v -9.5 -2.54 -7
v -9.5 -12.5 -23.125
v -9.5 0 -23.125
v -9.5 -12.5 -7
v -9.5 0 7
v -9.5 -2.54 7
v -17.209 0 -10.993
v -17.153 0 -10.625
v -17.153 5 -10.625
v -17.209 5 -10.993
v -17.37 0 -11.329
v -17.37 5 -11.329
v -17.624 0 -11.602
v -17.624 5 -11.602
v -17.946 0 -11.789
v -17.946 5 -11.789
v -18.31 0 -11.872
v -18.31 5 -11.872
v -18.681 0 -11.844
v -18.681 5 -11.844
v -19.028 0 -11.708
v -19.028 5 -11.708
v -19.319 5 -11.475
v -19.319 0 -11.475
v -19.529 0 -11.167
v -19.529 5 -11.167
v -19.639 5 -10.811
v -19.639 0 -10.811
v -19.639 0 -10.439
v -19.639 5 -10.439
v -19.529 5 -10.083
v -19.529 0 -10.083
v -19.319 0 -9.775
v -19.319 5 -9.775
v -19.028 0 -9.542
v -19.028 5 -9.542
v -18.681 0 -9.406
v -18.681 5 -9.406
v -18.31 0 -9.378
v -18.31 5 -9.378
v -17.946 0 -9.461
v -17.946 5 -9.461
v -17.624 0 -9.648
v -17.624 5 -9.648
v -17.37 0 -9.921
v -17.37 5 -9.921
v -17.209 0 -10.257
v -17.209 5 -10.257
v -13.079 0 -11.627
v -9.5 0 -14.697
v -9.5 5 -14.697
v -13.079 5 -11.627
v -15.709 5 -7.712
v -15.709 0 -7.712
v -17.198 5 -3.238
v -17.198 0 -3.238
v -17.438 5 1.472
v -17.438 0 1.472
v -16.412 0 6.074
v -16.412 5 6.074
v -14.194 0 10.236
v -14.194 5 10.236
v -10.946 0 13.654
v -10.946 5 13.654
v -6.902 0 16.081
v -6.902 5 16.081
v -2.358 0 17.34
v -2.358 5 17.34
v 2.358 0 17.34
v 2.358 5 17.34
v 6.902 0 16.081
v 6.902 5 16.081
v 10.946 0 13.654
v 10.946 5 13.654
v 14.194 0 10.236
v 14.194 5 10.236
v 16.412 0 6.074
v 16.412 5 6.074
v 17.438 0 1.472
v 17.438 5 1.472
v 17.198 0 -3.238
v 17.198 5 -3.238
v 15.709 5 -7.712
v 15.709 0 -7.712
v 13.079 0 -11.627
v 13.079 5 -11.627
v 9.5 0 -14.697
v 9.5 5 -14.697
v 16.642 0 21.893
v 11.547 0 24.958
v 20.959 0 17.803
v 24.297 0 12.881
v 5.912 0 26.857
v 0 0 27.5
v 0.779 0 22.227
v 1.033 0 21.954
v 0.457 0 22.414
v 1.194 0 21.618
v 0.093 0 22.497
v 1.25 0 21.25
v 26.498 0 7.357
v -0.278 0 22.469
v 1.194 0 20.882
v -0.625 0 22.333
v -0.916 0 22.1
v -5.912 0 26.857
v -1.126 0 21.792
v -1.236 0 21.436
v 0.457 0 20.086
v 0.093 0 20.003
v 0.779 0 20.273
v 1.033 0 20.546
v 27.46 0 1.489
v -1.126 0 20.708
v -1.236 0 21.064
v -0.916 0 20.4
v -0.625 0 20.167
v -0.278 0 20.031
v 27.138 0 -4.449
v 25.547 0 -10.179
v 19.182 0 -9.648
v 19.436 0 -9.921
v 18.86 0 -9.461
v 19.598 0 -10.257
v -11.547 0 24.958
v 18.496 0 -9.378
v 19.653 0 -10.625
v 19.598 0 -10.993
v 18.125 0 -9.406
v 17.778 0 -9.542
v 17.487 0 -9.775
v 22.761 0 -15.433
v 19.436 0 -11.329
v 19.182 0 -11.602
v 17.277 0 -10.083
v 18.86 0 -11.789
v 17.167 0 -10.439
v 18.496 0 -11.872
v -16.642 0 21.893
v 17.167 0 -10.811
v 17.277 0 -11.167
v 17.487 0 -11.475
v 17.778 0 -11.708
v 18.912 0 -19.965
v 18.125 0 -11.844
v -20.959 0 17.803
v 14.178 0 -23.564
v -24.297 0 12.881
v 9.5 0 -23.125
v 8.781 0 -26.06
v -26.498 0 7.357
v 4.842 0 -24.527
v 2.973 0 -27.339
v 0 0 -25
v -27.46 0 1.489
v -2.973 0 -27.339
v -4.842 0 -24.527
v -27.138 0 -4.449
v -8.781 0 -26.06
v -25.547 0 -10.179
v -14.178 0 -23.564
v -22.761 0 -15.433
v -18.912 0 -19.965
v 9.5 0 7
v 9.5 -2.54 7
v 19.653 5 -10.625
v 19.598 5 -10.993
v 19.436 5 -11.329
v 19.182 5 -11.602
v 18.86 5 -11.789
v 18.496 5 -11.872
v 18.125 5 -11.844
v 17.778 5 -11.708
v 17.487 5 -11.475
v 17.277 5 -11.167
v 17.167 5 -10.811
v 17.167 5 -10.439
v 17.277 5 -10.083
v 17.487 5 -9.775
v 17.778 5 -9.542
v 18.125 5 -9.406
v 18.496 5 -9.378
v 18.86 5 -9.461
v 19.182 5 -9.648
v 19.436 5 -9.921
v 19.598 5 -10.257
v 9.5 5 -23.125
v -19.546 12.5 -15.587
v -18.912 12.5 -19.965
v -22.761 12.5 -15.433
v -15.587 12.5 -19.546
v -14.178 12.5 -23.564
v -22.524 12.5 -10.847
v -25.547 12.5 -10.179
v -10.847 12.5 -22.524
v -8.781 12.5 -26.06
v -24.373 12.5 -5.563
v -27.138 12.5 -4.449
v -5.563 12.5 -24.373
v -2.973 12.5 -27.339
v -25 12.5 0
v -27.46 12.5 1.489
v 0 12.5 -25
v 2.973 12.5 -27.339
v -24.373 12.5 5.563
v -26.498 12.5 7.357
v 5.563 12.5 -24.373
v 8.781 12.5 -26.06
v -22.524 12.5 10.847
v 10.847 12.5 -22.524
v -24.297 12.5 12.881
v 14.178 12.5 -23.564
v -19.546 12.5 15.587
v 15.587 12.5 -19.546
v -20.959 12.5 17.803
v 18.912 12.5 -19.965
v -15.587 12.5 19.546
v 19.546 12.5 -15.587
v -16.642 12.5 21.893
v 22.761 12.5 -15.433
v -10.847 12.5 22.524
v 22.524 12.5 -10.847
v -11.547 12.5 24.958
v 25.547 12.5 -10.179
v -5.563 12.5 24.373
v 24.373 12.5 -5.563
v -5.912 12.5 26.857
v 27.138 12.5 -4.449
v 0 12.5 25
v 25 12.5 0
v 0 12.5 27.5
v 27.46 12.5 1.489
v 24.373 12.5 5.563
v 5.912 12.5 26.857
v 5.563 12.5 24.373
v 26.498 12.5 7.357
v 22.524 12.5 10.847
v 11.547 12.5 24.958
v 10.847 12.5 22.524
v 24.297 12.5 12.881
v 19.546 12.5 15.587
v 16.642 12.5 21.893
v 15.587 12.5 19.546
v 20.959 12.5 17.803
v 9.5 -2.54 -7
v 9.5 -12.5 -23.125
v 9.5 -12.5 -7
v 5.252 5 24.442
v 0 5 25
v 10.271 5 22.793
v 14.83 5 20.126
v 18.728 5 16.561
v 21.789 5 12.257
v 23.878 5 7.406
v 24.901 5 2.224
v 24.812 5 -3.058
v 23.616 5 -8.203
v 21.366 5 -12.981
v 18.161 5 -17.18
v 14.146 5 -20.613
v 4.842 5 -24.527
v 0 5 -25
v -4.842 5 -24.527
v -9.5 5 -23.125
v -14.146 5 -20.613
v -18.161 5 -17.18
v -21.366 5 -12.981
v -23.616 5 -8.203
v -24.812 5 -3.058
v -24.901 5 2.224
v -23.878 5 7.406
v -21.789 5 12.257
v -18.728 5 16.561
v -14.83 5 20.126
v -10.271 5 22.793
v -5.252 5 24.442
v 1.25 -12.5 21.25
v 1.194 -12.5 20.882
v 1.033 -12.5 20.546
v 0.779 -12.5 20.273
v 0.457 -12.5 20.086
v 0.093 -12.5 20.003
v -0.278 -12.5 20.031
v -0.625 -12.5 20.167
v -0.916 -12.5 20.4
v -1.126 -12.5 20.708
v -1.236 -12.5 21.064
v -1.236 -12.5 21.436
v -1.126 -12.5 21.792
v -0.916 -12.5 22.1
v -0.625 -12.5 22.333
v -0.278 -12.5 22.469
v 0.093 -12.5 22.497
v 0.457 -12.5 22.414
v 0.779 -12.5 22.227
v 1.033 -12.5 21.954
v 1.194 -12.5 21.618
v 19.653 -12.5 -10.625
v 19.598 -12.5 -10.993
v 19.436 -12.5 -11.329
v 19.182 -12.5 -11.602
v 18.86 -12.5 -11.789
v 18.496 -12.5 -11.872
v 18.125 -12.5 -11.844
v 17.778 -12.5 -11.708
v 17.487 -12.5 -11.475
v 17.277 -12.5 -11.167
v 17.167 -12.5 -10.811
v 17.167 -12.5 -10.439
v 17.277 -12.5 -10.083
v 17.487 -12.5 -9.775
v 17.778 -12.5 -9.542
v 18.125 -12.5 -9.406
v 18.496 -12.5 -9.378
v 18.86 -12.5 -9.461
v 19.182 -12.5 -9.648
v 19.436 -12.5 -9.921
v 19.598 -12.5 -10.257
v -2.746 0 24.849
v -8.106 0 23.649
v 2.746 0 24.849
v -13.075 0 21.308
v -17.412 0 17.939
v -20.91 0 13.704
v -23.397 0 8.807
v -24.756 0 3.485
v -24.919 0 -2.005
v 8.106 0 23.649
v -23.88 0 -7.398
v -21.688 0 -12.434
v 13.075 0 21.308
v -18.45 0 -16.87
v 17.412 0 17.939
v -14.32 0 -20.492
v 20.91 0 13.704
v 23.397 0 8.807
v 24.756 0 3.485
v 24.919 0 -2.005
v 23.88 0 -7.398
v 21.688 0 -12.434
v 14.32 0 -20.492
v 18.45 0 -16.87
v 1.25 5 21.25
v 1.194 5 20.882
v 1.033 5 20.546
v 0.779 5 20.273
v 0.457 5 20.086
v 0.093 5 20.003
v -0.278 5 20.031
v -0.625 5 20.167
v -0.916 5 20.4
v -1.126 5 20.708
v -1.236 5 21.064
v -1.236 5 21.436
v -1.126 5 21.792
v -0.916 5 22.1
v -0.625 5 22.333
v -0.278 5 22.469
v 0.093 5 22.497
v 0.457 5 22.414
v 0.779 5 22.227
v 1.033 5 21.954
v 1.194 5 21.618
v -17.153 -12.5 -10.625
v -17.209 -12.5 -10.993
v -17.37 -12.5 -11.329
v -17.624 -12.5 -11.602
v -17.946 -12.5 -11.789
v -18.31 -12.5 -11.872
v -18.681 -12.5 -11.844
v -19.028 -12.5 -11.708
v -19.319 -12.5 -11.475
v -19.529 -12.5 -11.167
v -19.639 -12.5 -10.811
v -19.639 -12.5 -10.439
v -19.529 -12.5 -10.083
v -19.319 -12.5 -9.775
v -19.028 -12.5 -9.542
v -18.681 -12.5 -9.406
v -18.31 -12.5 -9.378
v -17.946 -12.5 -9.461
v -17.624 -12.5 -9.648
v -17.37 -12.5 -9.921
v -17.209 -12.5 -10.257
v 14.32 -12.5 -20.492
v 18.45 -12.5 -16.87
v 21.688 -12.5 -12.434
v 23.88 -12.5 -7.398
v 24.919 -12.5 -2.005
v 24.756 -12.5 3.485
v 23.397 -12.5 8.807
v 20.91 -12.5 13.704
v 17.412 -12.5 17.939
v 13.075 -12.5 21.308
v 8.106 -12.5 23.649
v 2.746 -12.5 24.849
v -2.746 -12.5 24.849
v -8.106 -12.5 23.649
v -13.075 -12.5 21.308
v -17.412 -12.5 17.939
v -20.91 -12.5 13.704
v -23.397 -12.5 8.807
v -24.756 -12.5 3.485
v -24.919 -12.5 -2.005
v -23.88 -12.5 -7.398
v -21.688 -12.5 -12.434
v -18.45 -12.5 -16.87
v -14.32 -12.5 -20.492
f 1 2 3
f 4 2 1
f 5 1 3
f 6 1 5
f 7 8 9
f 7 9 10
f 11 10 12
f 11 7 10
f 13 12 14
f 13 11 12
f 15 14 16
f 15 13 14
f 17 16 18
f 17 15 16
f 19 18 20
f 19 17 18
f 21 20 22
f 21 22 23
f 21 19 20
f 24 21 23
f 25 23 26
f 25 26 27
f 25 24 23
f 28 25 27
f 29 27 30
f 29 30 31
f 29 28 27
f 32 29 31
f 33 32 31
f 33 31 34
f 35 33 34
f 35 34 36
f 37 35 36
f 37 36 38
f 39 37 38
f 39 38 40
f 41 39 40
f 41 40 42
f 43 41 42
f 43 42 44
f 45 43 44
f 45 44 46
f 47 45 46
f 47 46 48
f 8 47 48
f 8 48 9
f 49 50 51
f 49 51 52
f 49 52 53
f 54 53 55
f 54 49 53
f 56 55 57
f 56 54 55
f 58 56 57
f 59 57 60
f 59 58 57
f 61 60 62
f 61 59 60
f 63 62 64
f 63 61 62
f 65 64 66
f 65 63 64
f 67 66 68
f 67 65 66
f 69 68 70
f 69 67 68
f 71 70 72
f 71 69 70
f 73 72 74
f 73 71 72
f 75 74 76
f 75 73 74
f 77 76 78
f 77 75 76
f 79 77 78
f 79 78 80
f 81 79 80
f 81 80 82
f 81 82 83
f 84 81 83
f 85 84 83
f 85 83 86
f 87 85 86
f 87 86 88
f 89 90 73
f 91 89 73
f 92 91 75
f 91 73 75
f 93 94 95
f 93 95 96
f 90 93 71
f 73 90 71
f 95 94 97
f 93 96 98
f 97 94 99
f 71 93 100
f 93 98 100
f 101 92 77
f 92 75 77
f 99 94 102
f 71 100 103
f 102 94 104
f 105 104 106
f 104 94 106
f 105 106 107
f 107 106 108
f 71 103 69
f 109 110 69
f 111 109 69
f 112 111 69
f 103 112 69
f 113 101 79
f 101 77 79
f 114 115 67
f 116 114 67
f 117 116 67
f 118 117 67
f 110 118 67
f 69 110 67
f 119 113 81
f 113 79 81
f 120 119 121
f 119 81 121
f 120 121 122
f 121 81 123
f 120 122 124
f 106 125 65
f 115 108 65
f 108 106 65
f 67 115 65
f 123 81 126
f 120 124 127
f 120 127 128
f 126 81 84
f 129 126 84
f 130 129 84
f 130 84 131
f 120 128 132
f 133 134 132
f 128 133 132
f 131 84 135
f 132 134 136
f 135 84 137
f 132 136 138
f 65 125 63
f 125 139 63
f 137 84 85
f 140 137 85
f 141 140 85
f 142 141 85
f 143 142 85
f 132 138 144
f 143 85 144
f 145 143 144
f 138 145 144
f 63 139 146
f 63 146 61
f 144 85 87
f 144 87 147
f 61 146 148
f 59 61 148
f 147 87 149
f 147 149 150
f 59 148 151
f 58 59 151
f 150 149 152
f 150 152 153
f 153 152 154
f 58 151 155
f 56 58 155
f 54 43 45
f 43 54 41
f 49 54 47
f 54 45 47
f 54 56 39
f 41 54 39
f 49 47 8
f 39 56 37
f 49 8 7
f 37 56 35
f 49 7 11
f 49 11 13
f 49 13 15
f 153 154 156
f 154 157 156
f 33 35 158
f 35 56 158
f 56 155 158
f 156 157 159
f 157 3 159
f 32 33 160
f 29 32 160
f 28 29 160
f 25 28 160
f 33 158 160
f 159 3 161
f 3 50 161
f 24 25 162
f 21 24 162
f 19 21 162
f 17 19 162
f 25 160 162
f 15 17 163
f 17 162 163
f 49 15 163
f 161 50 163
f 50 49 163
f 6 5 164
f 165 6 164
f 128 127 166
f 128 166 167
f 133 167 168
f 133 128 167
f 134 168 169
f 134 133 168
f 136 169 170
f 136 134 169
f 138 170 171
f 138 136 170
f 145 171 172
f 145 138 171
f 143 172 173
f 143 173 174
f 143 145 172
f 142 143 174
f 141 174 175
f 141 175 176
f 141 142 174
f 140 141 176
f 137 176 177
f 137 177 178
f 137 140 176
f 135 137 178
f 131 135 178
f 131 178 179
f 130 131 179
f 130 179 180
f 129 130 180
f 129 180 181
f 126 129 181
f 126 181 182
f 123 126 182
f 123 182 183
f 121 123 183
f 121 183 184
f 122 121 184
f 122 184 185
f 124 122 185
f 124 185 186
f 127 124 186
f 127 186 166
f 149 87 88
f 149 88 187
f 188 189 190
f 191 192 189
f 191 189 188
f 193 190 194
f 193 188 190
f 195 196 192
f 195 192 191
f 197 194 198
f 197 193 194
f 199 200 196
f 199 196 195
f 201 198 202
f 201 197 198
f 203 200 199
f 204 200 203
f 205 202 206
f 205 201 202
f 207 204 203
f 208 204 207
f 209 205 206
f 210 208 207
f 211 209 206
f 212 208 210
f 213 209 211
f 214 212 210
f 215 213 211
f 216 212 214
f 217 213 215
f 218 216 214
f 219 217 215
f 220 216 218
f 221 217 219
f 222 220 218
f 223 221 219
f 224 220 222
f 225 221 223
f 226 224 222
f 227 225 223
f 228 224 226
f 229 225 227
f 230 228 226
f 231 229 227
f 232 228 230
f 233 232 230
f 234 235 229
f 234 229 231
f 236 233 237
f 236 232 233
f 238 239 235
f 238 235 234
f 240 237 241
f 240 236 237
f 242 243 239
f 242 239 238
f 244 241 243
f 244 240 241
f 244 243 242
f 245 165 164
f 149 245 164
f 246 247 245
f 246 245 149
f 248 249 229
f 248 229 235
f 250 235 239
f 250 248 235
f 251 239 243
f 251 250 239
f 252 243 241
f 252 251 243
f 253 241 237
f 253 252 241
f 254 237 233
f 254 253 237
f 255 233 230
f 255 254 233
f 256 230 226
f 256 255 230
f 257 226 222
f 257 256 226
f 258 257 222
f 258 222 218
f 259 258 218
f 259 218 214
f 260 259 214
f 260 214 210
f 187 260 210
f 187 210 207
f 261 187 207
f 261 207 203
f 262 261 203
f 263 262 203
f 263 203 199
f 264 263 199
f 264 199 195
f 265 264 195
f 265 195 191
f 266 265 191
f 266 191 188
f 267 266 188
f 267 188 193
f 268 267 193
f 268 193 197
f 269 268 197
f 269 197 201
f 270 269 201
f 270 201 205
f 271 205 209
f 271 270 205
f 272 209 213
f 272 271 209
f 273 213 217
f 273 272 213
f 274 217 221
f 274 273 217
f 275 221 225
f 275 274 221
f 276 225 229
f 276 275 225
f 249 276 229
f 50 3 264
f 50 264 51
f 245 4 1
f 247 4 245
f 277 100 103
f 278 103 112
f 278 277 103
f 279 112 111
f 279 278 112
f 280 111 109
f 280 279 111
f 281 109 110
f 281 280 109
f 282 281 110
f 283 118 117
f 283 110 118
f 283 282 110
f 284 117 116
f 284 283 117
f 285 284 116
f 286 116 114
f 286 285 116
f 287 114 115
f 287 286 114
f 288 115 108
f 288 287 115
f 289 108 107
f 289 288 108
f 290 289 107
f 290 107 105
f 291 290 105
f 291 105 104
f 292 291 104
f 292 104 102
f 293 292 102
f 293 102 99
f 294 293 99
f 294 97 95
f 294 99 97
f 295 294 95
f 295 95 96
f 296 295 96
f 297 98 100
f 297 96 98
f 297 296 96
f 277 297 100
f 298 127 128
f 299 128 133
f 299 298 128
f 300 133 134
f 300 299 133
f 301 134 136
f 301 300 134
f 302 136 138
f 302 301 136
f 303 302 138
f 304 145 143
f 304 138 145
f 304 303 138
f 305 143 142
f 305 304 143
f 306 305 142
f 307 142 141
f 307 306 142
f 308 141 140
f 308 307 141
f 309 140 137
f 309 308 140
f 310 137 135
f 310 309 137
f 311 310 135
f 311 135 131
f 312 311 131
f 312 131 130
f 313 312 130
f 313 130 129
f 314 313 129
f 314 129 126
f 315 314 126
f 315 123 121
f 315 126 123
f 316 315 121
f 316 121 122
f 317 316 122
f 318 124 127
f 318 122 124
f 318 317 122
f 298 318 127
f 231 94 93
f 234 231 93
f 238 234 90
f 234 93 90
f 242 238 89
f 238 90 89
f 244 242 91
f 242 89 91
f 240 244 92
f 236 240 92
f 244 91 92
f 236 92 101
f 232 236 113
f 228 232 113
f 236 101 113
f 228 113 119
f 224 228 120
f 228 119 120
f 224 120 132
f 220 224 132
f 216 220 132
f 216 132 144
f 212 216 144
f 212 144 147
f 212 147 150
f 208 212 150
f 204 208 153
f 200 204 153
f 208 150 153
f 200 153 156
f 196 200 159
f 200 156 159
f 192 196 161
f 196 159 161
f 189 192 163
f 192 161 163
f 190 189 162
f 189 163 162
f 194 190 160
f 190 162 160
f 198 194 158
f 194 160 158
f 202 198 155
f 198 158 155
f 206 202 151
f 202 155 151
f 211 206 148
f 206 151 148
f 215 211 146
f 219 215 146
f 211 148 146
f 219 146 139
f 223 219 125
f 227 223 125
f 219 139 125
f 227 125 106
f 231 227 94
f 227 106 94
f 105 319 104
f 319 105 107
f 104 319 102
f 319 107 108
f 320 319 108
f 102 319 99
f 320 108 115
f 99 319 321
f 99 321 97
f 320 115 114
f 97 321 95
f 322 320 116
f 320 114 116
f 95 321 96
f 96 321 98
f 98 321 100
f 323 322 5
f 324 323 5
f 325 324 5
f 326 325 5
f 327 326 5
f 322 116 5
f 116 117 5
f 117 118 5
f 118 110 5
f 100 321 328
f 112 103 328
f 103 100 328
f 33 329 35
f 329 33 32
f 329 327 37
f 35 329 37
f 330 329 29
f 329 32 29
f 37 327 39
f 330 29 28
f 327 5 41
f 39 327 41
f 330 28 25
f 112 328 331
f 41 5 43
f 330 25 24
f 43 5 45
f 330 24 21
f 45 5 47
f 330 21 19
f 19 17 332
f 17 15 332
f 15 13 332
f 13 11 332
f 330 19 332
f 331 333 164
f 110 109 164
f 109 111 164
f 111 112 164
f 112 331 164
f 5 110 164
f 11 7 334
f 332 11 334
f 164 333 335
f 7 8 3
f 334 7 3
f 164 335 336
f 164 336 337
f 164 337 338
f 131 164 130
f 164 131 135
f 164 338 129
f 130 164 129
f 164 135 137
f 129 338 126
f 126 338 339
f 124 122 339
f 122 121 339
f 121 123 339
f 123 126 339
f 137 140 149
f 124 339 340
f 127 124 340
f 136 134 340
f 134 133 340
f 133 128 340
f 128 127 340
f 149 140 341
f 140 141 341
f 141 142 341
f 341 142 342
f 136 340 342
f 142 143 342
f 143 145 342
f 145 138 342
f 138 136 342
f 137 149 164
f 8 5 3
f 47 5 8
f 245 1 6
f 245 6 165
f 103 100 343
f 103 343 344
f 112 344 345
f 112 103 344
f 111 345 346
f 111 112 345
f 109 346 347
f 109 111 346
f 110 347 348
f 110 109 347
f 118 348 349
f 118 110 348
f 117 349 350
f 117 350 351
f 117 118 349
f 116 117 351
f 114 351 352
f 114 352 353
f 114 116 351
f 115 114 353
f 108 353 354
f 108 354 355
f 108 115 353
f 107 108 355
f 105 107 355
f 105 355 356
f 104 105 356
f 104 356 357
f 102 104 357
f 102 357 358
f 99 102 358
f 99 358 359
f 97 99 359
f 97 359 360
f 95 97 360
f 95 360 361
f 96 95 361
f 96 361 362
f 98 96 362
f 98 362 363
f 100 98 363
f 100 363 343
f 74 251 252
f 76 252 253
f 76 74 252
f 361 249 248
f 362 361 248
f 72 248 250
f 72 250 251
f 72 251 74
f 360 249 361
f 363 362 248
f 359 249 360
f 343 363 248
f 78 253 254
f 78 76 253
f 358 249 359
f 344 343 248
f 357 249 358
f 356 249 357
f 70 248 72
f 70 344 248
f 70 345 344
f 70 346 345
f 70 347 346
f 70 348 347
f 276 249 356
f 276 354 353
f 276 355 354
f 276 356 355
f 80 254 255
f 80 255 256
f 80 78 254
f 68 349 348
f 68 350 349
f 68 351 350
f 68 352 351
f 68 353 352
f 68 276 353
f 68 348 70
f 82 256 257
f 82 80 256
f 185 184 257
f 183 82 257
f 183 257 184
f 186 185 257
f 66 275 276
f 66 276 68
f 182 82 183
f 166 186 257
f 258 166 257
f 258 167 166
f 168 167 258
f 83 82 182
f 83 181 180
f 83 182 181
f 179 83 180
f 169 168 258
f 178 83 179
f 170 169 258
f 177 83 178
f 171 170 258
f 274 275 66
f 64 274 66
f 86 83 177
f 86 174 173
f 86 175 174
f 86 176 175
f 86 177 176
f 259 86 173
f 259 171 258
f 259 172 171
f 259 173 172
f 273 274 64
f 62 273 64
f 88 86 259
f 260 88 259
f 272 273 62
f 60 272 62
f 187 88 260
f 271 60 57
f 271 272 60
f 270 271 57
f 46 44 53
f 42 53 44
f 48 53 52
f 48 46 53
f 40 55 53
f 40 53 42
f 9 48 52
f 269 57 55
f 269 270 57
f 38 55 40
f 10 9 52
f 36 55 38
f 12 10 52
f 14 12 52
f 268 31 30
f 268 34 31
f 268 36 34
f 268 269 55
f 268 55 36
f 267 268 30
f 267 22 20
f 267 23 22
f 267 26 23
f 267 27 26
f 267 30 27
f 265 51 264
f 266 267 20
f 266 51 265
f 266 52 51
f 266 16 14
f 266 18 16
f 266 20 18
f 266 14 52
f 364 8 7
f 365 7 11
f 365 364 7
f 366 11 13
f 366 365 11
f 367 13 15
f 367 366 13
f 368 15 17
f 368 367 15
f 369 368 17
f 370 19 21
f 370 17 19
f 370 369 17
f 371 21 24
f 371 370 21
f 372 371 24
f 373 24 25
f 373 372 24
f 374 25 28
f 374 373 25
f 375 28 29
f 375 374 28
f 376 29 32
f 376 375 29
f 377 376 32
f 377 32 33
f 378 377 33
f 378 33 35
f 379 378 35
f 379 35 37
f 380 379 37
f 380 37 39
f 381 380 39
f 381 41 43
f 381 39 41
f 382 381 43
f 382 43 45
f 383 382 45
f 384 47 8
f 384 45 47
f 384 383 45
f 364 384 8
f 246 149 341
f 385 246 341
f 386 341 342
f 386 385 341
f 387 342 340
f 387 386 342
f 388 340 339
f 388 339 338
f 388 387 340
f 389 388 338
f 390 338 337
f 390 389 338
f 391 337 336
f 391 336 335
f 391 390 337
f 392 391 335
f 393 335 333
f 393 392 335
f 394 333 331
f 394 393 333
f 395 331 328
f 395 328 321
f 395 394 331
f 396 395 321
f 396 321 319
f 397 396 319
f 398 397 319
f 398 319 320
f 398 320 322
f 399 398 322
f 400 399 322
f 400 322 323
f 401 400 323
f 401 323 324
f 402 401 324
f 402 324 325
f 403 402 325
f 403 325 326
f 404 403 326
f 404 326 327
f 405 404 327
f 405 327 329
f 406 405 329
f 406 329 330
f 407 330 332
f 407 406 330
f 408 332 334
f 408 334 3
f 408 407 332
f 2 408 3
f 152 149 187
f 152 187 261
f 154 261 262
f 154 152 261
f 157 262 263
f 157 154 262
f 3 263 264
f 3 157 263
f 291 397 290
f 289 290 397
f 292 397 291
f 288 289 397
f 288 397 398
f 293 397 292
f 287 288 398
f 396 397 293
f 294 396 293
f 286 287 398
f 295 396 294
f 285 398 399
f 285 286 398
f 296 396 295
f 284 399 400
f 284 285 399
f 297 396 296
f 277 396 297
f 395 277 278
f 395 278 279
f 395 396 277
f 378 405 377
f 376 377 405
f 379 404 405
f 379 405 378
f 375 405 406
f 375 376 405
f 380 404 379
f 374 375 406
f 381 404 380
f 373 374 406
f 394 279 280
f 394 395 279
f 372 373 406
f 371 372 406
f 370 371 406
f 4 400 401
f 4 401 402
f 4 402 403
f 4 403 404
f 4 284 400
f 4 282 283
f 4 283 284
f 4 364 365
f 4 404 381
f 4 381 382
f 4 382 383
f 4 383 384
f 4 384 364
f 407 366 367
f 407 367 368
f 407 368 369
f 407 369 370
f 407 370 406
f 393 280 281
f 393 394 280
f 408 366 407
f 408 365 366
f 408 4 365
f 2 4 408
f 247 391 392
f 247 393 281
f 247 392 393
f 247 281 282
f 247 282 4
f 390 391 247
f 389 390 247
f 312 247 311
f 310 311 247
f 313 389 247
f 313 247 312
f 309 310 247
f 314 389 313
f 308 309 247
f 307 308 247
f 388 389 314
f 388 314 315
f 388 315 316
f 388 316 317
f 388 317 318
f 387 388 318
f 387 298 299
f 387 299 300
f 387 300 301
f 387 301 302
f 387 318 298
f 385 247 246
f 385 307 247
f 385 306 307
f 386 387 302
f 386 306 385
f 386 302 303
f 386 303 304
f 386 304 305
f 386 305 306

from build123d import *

# Parameters (mm, degrees)
SKETCH1_R                           = 27.5
SKETCH1_R_2                         = 25
BOSS_EXTRUDE1_DEPTH                 = 12.5
BOSS_EXTRUDE2_START                 = 12.5
SKETCH2_R                           = 25
BOSS_EXTRUDE2_DEPTH                 = 12.5
SKETCH3_R                           = 25
SKETCH3_R_2                         = 17.5
BOSS_EXTRUDE3_DEPTH                 = 5
SKETCH4_W                           = 19
SKETCH4_H                           = 14
CUT_EXTRUDE5_DEPTH                  = 2.54
CUT_EXTRUDE2_START                  = -12.5
CUT_EXTRUDE2_DEPTH                  = 12.5
CUT_EXTRUDE6_START                  = -5
CUT_EXTRUDE6_DEPTH                  = 5
TAP_START                           = -12.5
TAP_DRILL_FOR_M3X0_5_TAP1_OUTLINE_R = 1.25
TAP_DRILL_FOR_M3X0_5_TAP1_DEPTH     = 17.5


# Read off the part's stored shape, not the designer's step: Cut-Extrude2, Tap Drill for M3x0.5 Tap1
with BuildPart() as part:
    # Sketch1 → Boss-Extrude1 (new body)
    with BuildSketch(Plane(origin=(0, 0, 0), x_dir=(1, 0, 0), z_dir=(0, 1, 0))):
        with Locations(Location((0, 0, 0), (0, 0, 270))):
            Circle(SKETCH1_R)
        with Locations(Location((0, 0, 0), (0, 0, 270))):
            Circle(SKETCH1_R_2, mode=Mode.SUBTRACT)
    extrude(amount=BOSS_EXTRUDE1_DEPTH)

    # Sketch3 → Boss-Extrude3 (add)
    with BuildSketch(Plane(origin=(0, 0, 0), x_dir=(1, 0, 0), z_dir=(0, 1, 0))):
        with Locations(Location((0, 0, 0), (0, 0, 90))):
            Circle(SKETCH3_R)
        with Locations(Location((0, 0, 0), (0, 0, 270))):
            Circle(SKETCH3_R_2, mode=Mode.SUBTRACT)
    extrude(amount=BOSS_EXTRUDE3_DEPTH)

    # Sketch7 → Cut-Extrude6 (cut)
    with BuildSketch(Plane(origin=(0, 5, 0), x_dir=(1, 0, 0), z_dir=(0, 1, 0)).offset(CUT_EXTRUDE6_START)):
        with BuildLine():
            Line((9.5, 14.696938457), (9.5, 23.12466216))
            ThreePointArc((9.5, 23.12466216), (0, 25), (-9.5, 23.12466216))
            Line((-9.5, 23.12466216), (-9.5, 14.696938457))
            ThreePointArc((-9.5, 14.696938457), (0, 17.5), (9.5, 14.696938457))
        make_face()
    extrude(amount=CUT_EXTRUDE6_DEPTH, mode=Mode.SUBTRACT)


with BuildPart() as body_2:
    # Sketch2 → Boss-Extrude2 (new body)
    with BuildSketch(Plane.XZ.offset(BOSS_EXTRUDE2_START)):
        with Locations(Location((0, 0, 0), (0, 0, 270))):
            Circle(SKETCH2_R)
    extrude(amount=-BOSS_EXTRUDE2_DEPTH)

    # Sketch4 → Cut-Extrude5 (cut)
    with BuildSketch(Plane(origin=(0, 0, 0), x_dir=(1, 0, 0), z_dir=(0, 1, 0))):
        Rectangle(SKETCH4_W, SKETCH4_H)
    extrude(amount=-CUT_EXTRUDE5_DEPTH, mode=Mode.SUBTRACT)

    # Cut-Extrude2 outline → Cut-Extrude2 (cut)
    with BuildSketch(Plane(origin=(0, 0, 0), x_dir=(1, 0, 0), z_dir=(0, 1, 0)).offset(CUT_EXTRUDE2_START)):
        with BuildLine():
            ThreePointArc((9.5, 23.12466216), (0, 25), (-9.5, 23.12466216))
            Line((-9.5, 23.12466216), (-9.5, 7))
            Line((-9.5, 7), (9.5, 7))
            Line((9.5, 7), (9.5, 23.12466216))
        make_face()
    extrude(amount=CUT_EXTRUDE2_DEPTH, mode=Mode.SUBTRACT)


with BuildPart() as tap_drill_for_m3x0_5_tap1_tool:
    # Tap Drill for M3x0.5 Tap1 outline → Tap Drill for M3x0.5 Tap1 (new body)
    with BuildSketch(Plane(origin=(0, 0, 0), x_dir=(1, 0, 0), z_dir=(0, 1, 0)).offset(TAP_START)):
        with Locations((-18.40303983, 10.625)):
            Circle(TAP_DRILL_FOR_M3X0_5_TAP1_OUTLINE_R)
        with Locations((0, -21.25)):
            Circle(TAP_DRILL_FOR_M3X0_5_TAP1_OUTLINE_R)
        with Locations((18.40303983, 10.625)):
            Circle(TAP_DRILL_FOR_M3X0_5_TAP1_OUTLINE_R)
    extrude(amount=TAP_DRILL_FOR_M3X0_5_TAP1_DEPTH)


with BuildPart() as part_1:
    add(part.part)

    # Tap Drill for M3x0.5 Tap1: cut by tap_drill_for_m3x0_5_tap1_tool
    add(tap_drill_for_m3x0_5_tap1_tool.part, mode=Mode.SUBTRACT)


with BuildPart() as body_2_1:
    add(body_2.part)

    # Tap Drill for M3x0.5 Tap1: cut by tap_drill_for_m3x0_5_tap1_tool
    add(tap_drill_for_m3x0_5_tap1_tool.part, mode=Mode.SUBTRACT)


solid = Compound([part_1.part, body_2_1.part])
